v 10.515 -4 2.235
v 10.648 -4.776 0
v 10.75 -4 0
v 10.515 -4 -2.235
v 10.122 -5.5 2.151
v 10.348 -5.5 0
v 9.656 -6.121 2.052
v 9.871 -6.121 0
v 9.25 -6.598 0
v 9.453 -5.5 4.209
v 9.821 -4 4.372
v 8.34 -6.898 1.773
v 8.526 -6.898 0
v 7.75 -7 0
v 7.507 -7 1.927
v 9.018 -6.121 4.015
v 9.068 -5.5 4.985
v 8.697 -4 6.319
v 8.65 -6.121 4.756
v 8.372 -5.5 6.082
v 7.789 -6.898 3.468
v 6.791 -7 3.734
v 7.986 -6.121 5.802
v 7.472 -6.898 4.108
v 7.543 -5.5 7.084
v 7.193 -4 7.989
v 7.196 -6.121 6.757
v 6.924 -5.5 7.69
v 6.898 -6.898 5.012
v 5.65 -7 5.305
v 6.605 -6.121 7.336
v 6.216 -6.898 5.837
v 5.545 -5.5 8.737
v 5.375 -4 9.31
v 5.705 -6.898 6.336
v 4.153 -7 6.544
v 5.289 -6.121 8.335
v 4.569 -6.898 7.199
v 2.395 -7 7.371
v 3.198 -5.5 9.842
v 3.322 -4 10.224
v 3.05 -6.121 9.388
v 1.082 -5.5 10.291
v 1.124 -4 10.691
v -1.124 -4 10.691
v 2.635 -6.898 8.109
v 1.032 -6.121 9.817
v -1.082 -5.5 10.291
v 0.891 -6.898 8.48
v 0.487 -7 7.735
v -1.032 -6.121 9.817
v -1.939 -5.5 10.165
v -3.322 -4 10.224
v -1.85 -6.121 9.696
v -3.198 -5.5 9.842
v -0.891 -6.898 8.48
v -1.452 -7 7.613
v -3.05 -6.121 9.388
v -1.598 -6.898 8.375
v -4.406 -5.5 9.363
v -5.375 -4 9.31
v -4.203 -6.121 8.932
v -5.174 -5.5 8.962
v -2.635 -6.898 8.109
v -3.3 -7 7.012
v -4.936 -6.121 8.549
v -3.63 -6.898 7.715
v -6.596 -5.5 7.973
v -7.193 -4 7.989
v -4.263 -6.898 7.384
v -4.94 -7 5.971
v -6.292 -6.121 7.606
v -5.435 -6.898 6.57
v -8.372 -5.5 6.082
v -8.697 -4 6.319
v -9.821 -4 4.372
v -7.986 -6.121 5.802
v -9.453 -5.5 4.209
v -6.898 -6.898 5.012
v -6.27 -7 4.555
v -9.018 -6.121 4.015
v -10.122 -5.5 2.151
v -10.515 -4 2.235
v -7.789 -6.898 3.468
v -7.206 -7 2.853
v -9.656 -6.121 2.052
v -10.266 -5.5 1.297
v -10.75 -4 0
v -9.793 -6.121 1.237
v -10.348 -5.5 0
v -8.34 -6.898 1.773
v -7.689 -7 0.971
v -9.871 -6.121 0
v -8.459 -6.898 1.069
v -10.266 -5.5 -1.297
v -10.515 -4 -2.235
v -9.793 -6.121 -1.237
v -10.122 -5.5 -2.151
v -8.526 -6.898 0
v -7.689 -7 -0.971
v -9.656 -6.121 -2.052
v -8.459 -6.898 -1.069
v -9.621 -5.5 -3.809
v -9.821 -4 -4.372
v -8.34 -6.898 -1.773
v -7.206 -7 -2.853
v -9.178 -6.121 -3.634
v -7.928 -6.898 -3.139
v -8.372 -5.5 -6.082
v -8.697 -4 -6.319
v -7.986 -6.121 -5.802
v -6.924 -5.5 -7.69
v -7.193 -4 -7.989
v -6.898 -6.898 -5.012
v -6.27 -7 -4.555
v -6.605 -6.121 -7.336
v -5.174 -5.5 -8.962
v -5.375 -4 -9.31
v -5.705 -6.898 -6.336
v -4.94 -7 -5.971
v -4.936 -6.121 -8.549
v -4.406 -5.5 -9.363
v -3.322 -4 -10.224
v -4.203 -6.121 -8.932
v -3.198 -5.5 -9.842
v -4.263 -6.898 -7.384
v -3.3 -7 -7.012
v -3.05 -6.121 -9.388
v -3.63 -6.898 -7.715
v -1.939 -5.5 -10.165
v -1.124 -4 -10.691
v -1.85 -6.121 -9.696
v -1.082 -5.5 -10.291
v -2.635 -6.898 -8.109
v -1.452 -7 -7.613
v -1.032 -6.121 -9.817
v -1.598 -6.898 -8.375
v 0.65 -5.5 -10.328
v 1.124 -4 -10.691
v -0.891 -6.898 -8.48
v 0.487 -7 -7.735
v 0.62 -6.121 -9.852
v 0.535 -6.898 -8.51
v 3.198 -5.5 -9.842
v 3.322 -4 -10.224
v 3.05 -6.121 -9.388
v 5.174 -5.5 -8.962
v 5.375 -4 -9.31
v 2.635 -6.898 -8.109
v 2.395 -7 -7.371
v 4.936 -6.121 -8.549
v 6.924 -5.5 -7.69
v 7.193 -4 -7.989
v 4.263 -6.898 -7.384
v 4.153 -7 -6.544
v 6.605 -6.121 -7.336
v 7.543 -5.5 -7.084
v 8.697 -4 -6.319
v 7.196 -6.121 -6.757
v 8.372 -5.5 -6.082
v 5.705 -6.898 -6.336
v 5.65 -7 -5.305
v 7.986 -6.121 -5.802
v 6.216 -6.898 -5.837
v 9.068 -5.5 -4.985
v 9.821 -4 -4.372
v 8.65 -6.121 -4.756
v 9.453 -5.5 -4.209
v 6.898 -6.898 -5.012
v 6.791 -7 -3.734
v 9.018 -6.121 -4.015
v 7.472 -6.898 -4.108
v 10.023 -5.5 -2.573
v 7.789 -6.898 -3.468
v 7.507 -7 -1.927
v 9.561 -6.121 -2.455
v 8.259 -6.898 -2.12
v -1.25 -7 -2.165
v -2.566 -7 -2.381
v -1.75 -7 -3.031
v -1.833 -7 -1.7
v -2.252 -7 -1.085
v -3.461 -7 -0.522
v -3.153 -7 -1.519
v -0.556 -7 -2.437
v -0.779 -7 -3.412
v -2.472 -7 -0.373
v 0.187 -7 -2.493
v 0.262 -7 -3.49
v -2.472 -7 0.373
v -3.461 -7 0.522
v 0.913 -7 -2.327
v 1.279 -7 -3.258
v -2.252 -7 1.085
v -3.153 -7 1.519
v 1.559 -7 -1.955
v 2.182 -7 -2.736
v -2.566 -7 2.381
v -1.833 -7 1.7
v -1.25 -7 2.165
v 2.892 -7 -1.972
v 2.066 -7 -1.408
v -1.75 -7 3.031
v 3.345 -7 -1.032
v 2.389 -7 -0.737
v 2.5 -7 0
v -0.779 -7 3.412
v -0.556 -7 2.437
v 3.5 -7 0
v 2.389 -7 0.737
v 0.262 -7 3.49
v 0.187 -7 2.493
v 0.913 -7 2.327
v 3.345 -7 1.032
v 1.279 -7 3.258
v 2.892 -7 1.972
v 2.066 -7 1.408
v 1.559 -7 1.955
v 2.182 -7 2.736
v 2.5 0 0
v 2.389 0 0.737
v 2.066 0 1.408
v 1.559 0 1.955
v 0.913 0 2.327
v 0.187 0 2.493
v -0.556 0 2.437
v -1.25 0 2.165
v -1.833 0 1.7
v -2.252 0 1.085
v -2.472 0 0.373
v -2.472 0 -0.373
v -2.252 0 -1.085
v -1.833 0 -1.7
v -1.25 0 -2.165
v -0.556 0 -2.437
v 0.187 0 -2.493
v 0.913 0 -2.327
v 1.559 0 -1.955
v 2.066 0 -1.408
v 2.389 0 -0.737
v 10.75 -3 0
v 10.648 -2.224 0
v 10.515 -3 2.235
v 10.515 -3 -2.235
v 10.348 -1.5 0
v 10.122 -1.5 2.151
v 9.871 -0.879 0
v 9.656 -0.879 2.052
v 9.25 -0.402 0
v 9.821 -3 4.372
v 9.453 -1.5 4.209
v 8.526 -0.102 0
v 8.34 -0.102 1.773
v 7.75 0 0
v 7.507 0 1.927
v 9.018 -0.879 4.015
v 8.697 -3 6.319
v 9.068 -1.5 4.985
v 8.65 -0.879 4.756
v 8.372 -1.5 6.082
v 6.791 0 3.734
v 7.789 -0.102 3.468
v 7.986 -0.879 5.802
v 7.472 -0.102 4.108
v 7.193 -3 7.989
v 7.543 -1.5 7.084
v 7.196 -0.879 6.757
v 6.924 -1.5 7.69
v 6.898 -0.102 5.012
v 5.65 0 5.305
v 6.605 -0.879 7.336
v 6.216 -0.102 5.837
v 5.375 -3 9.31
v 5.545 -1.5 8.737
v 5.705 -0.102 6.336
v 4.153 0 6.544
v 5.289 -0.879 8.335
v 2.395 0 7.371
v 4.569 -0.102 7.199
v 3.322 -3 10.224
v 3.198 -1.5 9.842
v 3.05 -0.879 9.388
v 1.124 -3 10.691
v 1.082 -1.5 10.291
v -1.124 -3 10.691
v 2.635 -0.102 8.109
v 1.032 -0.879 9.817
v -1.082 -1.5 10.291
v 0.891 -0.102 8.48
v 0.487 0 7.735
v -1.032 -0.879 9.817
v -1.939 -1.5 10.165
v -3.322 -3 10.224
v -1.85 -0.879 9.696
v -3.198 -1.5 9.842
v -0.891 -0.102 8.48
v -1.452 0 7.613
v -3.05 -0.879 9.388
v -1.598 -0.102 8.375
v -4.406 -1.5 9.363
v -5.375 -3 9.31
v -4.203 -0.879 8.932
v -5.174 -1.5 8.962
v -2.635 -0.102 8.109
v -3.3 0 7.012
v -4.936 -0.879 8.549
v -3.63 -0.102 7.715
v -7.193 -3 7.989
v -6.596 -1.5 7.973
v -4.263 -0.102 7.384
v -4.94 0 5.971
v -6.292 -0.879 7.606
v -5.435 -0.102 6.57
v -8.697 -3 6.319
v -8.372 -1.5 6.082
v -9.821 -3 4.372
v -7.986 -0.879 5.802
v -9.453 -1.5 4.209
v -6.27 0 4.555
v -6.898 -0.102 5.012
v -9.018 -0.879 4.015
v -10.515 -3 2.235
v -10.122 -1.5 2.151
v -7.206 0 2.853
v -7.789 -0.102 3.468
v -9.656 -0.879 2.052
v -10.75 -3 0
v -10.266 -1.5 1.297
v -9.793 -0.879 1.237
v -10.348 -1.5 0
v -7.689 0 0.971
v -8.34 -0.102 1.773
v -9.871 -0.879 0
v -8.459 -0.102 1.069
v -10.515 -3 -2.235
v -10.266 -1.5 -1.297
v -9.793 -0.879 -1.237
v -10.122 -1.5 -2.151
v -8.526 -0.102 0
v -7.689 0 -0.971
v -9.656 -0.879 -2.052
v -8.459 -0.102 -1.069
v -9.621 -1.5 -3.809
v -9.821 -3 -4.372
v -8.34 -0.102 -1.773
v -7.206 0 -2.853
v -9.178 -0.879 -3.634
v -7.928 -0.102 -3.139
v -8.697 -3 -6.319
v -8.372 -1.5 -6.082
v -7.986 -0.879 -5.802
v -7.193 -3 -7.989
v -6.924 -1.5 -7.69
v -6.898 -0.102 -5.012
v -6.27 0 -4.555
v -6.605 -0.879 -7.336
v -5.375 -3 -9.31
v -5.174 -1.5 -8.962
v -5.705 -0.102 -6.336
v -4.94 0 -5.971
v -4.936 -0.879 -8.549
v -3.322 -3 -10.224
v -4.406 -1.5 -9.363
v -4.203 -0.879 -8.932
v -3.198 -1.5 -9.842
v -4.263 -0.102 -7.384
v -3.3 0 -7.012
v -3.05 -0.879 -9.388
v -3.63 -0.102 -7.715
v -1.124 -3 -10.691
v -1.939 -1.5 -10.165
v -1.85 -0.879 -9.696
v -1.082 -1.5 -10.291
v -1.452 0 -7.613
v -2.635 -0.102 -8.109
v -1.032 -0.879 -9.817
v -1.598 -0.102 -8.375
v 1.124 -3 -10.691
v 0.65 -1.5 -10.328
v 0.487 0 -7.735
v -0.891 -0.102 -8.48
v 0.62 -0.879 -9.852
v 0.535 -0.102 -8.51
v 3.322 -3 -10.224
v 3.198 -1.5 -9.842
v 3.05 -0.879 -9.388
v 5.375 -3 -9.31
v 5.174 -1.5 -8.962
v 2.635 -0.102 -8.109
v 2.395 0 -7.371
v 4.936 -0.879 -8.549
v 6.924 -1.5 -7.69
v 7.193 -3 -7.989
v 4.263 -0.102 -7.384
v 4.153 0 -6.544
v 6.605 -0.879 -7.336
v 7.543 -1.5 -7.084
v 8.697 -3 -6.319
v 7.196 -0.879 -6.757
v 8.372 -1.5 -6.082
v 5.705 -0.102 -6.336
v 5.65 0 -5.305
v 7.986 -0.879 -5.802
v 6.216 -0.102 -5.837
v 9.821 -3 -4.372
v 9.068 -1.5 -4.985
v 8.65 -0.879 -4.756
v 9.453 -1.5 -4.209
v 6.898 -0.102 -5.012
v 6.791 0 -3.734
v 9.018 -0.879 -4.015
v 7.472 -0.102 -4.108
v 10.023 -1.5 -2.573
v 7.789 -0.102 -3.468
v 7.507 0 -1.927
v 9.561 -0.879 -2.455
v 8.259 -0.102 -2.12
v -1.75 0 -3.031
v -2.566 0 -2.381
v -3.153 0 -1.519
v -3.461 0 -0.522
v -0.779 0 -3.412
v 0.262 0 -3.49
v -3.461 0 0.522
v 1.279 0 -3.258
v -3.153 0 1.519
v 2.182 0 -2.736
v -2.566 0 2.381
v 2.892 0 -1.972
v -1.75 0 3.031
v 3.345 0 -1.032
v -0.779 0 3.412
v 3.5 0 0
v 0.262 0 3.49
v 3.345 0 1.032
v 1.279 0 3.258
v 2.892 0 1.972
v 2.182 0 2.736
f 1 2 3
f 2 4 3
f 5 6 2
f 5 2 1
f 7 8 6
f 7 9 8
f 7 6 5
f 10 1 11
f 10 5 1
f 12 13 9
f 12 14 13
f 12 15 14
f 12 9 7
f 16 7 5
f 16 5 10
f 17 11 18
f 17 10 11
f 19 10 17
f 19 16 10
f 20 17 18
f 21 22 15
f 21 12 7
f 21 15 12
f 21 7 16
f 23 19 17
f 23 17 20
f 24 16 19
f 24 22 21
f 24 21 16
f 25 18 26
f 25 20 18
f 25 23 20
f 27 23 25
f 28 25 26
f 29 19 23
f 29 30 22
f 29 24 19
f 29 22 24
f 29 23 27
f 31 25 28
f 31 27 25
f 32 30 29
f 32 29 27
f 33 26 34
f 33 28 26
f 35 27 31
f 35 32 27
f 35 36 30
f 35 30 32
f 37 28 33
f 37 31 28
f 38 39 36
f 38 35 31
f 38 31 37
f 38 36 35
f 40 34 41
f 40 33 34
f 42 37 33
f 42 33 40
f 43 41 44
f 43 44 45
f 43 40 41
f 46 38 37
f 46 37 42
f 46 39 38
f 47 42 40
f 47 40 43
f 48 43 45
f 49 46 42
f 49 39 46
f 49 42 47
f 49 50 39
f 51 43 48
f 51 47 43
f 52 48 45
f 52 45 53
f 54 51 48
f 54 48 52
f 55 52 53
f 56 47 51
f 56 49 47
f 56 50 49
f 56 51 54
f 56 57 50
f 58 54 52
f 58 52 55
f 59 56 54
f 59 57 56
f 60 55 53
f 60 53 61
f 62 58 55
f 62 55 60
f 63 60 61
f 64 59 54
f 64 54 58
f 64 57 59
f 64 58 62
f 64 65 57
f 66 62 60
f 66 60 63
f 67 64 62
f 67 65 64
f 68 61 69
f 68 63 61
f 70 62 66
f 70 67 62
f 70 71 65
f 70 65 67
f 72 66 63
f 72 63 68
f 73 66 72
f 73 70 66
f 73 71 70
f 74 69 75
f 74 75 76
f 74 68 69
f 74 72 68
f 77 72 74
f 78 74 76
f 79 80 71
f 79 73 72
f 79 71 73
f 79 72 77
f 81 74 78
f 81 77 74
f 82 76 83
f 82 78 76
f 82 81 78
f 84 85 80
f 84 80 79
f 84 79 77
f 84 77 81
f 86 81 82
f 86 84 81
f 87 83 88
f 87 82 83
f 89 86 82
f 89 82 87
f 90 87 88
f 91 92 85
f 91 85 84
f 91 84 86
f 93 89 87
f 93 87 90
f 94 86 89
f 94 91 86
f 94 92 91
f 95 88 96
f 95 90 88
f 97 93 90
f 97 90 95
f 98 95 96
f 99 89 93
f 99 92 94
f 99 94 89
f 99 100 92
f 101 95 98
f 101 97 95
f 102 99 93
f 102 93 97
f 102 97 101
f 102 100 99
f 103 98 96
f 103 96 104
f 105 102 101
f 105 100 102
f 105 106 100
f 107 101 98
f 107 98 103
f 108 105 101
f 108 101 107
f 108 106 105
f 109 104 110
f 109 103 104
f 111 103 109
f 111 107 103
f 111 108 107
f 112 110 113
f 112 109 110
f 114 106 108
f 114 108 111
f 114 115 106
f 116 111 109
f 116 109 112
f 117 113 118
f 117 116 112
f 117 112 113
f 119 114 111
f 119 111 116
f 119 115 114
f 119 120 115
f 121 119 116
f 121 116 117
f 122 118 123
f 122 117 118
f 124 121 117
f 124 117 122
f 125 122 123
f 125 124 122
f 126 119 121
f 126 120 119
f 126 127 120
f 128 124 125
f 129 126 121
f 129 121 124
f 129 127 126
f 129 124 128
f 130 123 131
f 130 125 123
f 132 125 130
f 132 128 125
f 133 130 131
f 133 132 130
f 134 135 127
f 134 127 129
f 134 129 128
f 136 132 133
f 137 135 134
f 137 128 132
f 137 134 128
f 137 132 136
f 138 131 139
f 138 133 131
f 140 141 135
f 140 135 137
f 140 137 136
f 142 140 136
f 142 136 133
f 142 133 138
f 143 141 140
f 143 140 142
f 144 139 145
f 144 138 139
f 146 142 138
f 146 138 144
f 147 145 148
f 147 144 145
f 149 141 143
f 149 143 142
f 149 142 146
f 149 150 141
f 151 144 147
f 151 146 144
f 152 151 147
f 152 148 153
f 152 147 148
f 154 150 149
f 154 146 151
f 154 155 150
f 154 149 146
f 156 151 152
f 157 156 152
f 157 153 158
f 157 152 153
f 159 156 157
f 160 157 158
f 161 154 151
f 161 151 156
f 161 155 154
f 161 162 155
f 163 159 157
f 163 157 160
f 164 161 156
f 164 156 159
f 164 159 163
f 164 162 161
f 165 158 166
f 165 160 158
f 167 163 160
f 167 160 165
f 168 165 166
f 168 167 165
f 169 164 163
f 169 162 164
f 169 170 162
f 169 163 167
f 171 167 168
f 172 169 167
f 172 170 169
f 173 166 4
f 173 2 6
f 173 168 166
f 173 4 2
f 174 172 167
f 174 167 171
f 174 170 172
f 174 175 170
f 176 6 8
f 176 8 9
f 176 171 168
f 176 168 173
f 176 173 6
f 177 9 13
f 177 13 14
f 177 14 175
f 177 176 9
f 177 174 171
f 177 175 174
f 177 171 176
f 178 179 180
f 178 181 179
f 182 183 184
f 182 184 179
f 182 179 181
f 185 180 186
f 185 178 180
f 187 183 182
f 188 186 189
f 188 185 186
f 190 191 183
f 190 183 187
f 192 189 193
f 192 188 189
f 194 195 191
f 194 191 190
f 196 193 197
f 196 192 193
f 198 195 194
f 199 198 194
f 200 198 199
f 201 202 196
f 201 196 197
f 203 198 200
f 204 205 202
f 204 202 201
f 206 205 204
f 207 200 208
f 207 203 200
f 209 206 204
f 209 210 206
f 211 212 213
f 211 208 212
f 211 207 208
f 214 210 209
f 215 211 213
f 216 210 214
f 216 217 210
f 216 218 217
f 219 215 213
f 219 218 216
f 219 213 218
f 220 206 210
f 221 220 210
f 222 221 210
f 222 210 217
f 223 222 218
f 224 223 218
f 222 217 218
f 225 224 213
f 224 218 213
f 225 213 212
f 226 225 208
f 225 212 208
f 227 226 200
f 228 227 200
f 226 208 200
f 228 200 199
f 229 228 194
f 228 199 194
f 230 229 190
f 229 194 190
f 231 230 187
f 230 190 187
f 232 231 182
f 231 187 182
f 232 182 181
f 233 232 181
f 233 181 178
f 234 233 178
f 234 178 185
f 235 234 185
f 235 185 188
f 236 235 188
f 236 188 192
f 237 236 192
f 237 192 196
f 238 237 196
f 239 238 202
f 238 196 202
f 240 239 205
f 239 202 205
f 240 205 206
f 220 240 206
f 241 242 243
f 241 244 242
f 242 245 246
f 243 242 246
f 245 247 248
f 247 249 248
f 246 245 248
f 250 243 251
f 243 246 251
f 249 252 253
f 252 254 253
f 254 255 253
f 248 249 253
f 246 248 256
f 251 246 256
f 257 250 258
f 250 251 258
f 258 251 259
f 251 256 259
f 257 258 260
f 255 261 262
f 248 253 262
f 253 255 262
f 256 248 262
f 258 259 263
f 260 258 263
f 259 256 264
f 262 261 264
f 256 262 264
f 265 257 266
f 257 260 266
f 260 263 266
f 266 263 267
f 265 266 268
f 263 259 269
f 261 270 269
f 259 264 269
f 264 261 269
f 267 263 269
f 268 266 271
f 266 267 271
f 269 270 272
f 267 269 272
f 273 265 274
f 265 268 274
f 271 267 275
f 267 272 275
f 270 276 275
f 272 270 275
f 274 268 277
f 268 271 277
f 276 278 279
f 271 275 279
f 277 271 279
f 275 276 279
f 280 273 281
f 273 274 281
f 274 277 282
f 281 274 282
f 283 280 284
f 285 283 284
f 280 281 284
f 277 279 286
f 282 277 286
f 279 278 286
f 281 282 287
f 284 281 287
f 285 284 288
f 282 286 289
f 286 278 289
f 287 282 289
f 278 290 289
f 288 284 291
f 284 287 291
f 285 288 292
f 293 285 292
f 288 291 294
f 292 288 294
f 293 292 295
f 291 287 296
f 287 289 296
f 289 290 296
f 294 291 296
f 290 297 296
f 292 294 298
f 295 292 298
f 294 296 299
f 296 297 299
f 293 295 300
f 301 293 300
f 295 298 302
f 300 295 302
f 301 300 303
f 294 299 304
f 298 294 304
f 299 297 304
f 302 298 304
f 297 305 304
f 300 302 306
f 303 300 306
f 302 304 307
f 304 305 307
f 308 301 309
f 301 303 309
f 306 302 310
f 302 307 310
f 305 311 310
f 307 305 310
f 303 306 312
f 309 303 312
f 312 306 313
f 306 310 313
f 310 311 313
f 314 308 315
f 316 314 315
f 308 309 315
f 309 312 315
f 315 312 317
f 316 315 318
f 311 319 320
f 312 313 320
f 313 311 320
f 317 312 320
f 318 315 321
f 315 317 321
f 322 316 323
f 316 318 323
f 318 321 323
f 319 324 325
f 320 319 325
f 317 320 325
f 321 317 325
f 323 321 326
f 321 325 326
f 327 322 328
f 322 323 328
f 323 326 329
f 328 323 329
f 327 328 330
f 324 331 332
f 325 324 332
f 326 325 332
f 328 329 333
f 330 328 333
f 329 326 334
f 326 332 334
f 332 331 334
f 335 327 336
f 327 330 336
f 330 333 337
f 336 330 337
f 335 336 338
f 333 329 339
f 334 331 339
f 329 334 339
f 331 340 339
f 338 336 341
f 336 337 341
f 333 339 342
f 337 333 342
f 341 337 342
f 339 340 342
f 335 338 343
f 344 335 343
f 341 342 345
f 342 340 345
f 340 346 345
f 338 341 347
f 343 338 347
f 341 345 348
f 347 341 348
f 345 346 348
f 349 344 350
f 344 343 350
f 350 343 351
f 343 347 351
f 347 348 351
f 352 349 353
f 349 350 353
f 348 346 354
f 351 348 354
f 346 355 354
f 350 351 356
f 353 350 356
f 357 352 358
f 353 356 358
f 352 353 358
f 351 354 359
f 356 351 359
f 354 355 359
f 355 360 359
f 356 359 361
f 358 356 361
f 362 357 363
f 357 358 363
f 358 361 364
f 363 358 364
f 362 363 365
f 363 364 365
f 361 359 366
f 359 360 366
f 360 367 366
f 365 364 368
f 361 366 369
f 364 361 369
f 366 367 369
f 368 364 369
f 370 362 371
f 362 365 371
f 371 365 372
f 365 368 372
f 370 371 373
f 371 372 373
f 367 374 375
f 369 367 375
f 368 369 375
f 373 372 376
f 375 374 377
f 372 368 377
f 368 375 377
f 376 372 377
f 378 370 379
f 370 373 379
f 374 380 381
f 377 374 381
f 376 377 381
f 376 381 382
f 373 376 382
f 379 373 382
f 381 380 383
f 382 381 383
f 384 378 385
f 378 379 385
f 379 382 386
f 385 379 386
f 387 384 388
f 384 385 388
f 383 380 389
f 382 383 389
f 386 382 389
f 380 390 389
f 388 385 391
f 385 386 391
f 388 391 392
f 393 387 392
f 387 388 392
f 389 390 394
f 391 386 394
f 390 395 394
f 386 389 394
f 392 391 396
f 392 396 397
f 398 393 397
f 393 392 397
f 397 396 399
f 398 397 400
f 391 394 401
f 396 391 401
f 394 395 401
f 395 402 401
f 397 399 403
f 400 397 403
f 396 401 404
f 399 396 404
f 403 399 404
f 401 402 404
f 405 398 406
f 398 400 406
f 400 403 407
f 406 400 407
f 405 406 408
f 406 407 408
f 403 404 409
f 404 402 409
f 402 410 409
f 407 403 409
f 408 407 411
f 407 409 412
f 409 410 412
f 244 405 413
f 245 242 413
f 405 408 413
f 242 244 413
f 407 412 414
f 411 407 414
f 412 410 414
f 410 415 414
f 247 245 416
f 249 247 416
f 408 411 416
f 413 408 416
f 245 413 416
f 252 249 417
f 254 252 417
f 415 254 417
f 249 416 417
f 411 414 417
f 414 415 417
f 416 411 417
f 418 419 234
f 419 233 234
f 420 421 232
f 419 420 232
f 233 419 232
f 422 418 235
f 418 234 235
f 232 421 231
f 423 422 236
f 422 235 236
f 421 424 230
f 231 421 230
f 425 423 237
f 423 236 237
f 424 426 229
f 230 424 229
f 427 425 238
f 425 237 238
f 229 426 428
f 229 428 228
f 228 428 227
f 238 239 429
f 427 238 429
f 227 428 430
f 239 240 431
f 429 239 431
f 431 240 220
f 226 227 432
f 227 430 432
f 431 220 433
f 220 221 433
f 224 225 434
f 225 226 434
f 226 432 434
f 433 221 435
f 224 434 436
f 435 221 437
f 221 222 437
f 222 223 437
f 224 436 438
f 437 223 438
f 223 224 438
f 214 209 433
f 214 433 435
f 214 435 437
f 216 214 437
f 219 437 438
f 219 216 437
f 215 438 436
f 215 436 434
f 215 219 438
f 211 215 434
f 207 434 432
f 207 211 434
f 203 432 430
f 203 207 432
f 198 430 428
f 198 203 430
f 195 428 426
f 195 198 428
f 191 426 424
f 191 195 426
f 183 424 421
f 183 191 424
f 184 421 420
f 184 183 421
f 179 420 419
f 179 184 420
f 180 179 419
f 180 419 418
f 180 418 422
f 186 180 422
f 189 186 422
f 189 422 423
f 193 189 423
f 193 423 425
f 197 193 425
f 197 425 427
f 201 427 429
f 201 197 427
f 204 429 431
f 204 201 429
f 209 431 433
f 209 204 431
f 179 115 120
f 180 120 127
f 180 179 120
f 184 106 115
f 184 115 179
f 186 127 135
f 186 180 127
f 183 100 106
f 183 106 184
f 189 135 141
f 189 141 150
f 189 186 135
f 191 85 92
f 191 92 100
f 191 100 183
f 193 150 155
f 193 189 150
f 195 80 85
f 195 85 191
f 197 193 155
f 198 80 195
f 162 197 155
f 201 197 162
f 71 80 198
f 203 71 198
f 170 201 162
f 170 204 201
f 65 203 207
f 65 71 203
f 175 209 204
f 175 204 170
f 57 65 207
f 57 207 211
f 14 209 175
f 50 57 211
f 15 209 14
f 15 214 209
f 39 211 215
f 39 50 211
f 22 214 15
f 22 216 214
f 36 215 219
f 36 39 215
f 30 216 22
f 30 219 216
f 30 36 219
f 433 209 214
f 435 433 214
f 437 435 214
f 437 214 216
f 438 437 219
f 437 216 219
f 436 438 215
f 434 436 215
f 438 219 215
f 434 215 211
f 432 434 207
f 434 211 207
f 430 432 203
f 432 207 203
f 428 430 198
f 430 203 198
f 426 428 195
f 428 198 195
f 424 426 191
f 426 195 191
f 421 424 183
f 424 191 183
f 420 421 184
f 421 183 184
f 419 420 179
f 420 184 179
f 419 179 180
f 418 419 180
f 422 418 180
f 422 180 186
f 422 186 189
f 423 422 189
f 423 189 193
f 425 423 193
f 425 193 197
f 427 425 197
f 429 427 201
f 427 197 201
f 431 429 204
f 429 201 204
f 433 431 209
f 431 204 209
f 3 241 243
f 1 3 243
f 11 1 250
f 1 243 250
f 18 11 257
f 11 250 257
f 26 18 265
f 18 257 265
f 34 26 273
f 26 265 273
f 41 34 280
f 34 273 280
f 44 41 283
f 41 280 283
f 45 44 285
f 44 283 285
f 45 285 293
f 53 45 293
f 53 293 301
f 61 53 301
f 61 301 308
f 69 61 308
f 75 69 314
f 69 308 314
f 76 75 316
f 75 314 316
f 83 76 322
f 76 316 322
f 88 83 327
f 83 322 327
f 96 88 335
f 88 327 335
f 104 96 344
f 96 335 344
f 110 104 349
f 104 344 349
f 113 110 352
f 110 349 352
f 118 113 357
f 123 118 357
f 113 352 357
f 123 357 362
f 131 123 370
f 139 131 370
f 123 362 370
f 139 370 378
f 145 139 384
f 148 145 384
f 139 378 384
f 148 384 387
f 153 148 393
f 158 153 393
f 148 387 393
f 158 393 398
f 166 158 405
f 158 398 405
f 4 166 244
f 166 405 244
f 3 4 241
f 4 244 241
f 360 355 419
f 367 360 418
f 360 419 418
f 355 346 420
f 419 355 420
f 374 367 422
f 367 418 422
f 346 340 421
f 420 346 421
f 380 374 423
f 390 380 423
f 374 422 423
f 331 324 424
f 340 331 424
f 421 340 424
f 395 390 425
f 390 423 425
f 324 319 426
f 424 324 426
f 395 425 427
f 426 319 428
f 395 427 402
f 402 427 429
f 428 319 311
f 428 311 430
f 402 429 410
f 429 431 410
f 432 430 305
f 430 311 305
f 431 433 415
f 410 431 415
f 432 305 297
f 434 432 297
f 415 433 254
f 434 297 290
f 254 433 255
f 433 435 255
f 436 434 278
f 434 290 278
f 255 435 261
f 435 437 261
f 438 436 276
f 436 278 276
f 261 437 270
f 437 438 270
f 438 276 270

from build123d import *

# Parameters (mm, degrees)
F0_R     = 10.75
F0_R_2   = 7
F1_DEPTH = 7
F2_R     = 3
F3_R     = 7
F3_R_2   = 3.5
F4_DEPTH = 7
F5_R     = 3.5
F5_R_2   = 2.5
F6_DEPTH = 7


with BuildPart() as f1:
    # F0 (on Front) → F1 (new body)
    with BuildSketch(Plane.XZ):
        Circle(F0_R)
        Circle(F0_R_2, mode=Mode.SUBTRACT)
    extrude(amount=F1_DEPTH)

    # F2
    f2_edges = [f1.edges().sort_by_distance(p)[0] for p in [
        (-10.75, -7, 0),
        (-10.75, 0, 0),
    ]]
    fillet(f2_edges, radius=F2_R)

    # F3 (on face) → F4 (join)
    with BuildSketch(Plane.XZ.offset(7)):
        Circle(F3_R)
        Circle(F3_R_2, mode=Mode.SUBTRACT)
    extrude(amount=-F4_DEPTH)


with BuildPart() as f6:
    # F5 (on face) → F6 (new body)
    with BuildSketch(Plane.XZ.offset(7)):
        Circle(F5_R)
        Circle(F5_R_2, mode=Mode.SUBTRACT)
    extrude(amount=-F6_DEPTH)


solid = Compound([f1.part, f6.part])
